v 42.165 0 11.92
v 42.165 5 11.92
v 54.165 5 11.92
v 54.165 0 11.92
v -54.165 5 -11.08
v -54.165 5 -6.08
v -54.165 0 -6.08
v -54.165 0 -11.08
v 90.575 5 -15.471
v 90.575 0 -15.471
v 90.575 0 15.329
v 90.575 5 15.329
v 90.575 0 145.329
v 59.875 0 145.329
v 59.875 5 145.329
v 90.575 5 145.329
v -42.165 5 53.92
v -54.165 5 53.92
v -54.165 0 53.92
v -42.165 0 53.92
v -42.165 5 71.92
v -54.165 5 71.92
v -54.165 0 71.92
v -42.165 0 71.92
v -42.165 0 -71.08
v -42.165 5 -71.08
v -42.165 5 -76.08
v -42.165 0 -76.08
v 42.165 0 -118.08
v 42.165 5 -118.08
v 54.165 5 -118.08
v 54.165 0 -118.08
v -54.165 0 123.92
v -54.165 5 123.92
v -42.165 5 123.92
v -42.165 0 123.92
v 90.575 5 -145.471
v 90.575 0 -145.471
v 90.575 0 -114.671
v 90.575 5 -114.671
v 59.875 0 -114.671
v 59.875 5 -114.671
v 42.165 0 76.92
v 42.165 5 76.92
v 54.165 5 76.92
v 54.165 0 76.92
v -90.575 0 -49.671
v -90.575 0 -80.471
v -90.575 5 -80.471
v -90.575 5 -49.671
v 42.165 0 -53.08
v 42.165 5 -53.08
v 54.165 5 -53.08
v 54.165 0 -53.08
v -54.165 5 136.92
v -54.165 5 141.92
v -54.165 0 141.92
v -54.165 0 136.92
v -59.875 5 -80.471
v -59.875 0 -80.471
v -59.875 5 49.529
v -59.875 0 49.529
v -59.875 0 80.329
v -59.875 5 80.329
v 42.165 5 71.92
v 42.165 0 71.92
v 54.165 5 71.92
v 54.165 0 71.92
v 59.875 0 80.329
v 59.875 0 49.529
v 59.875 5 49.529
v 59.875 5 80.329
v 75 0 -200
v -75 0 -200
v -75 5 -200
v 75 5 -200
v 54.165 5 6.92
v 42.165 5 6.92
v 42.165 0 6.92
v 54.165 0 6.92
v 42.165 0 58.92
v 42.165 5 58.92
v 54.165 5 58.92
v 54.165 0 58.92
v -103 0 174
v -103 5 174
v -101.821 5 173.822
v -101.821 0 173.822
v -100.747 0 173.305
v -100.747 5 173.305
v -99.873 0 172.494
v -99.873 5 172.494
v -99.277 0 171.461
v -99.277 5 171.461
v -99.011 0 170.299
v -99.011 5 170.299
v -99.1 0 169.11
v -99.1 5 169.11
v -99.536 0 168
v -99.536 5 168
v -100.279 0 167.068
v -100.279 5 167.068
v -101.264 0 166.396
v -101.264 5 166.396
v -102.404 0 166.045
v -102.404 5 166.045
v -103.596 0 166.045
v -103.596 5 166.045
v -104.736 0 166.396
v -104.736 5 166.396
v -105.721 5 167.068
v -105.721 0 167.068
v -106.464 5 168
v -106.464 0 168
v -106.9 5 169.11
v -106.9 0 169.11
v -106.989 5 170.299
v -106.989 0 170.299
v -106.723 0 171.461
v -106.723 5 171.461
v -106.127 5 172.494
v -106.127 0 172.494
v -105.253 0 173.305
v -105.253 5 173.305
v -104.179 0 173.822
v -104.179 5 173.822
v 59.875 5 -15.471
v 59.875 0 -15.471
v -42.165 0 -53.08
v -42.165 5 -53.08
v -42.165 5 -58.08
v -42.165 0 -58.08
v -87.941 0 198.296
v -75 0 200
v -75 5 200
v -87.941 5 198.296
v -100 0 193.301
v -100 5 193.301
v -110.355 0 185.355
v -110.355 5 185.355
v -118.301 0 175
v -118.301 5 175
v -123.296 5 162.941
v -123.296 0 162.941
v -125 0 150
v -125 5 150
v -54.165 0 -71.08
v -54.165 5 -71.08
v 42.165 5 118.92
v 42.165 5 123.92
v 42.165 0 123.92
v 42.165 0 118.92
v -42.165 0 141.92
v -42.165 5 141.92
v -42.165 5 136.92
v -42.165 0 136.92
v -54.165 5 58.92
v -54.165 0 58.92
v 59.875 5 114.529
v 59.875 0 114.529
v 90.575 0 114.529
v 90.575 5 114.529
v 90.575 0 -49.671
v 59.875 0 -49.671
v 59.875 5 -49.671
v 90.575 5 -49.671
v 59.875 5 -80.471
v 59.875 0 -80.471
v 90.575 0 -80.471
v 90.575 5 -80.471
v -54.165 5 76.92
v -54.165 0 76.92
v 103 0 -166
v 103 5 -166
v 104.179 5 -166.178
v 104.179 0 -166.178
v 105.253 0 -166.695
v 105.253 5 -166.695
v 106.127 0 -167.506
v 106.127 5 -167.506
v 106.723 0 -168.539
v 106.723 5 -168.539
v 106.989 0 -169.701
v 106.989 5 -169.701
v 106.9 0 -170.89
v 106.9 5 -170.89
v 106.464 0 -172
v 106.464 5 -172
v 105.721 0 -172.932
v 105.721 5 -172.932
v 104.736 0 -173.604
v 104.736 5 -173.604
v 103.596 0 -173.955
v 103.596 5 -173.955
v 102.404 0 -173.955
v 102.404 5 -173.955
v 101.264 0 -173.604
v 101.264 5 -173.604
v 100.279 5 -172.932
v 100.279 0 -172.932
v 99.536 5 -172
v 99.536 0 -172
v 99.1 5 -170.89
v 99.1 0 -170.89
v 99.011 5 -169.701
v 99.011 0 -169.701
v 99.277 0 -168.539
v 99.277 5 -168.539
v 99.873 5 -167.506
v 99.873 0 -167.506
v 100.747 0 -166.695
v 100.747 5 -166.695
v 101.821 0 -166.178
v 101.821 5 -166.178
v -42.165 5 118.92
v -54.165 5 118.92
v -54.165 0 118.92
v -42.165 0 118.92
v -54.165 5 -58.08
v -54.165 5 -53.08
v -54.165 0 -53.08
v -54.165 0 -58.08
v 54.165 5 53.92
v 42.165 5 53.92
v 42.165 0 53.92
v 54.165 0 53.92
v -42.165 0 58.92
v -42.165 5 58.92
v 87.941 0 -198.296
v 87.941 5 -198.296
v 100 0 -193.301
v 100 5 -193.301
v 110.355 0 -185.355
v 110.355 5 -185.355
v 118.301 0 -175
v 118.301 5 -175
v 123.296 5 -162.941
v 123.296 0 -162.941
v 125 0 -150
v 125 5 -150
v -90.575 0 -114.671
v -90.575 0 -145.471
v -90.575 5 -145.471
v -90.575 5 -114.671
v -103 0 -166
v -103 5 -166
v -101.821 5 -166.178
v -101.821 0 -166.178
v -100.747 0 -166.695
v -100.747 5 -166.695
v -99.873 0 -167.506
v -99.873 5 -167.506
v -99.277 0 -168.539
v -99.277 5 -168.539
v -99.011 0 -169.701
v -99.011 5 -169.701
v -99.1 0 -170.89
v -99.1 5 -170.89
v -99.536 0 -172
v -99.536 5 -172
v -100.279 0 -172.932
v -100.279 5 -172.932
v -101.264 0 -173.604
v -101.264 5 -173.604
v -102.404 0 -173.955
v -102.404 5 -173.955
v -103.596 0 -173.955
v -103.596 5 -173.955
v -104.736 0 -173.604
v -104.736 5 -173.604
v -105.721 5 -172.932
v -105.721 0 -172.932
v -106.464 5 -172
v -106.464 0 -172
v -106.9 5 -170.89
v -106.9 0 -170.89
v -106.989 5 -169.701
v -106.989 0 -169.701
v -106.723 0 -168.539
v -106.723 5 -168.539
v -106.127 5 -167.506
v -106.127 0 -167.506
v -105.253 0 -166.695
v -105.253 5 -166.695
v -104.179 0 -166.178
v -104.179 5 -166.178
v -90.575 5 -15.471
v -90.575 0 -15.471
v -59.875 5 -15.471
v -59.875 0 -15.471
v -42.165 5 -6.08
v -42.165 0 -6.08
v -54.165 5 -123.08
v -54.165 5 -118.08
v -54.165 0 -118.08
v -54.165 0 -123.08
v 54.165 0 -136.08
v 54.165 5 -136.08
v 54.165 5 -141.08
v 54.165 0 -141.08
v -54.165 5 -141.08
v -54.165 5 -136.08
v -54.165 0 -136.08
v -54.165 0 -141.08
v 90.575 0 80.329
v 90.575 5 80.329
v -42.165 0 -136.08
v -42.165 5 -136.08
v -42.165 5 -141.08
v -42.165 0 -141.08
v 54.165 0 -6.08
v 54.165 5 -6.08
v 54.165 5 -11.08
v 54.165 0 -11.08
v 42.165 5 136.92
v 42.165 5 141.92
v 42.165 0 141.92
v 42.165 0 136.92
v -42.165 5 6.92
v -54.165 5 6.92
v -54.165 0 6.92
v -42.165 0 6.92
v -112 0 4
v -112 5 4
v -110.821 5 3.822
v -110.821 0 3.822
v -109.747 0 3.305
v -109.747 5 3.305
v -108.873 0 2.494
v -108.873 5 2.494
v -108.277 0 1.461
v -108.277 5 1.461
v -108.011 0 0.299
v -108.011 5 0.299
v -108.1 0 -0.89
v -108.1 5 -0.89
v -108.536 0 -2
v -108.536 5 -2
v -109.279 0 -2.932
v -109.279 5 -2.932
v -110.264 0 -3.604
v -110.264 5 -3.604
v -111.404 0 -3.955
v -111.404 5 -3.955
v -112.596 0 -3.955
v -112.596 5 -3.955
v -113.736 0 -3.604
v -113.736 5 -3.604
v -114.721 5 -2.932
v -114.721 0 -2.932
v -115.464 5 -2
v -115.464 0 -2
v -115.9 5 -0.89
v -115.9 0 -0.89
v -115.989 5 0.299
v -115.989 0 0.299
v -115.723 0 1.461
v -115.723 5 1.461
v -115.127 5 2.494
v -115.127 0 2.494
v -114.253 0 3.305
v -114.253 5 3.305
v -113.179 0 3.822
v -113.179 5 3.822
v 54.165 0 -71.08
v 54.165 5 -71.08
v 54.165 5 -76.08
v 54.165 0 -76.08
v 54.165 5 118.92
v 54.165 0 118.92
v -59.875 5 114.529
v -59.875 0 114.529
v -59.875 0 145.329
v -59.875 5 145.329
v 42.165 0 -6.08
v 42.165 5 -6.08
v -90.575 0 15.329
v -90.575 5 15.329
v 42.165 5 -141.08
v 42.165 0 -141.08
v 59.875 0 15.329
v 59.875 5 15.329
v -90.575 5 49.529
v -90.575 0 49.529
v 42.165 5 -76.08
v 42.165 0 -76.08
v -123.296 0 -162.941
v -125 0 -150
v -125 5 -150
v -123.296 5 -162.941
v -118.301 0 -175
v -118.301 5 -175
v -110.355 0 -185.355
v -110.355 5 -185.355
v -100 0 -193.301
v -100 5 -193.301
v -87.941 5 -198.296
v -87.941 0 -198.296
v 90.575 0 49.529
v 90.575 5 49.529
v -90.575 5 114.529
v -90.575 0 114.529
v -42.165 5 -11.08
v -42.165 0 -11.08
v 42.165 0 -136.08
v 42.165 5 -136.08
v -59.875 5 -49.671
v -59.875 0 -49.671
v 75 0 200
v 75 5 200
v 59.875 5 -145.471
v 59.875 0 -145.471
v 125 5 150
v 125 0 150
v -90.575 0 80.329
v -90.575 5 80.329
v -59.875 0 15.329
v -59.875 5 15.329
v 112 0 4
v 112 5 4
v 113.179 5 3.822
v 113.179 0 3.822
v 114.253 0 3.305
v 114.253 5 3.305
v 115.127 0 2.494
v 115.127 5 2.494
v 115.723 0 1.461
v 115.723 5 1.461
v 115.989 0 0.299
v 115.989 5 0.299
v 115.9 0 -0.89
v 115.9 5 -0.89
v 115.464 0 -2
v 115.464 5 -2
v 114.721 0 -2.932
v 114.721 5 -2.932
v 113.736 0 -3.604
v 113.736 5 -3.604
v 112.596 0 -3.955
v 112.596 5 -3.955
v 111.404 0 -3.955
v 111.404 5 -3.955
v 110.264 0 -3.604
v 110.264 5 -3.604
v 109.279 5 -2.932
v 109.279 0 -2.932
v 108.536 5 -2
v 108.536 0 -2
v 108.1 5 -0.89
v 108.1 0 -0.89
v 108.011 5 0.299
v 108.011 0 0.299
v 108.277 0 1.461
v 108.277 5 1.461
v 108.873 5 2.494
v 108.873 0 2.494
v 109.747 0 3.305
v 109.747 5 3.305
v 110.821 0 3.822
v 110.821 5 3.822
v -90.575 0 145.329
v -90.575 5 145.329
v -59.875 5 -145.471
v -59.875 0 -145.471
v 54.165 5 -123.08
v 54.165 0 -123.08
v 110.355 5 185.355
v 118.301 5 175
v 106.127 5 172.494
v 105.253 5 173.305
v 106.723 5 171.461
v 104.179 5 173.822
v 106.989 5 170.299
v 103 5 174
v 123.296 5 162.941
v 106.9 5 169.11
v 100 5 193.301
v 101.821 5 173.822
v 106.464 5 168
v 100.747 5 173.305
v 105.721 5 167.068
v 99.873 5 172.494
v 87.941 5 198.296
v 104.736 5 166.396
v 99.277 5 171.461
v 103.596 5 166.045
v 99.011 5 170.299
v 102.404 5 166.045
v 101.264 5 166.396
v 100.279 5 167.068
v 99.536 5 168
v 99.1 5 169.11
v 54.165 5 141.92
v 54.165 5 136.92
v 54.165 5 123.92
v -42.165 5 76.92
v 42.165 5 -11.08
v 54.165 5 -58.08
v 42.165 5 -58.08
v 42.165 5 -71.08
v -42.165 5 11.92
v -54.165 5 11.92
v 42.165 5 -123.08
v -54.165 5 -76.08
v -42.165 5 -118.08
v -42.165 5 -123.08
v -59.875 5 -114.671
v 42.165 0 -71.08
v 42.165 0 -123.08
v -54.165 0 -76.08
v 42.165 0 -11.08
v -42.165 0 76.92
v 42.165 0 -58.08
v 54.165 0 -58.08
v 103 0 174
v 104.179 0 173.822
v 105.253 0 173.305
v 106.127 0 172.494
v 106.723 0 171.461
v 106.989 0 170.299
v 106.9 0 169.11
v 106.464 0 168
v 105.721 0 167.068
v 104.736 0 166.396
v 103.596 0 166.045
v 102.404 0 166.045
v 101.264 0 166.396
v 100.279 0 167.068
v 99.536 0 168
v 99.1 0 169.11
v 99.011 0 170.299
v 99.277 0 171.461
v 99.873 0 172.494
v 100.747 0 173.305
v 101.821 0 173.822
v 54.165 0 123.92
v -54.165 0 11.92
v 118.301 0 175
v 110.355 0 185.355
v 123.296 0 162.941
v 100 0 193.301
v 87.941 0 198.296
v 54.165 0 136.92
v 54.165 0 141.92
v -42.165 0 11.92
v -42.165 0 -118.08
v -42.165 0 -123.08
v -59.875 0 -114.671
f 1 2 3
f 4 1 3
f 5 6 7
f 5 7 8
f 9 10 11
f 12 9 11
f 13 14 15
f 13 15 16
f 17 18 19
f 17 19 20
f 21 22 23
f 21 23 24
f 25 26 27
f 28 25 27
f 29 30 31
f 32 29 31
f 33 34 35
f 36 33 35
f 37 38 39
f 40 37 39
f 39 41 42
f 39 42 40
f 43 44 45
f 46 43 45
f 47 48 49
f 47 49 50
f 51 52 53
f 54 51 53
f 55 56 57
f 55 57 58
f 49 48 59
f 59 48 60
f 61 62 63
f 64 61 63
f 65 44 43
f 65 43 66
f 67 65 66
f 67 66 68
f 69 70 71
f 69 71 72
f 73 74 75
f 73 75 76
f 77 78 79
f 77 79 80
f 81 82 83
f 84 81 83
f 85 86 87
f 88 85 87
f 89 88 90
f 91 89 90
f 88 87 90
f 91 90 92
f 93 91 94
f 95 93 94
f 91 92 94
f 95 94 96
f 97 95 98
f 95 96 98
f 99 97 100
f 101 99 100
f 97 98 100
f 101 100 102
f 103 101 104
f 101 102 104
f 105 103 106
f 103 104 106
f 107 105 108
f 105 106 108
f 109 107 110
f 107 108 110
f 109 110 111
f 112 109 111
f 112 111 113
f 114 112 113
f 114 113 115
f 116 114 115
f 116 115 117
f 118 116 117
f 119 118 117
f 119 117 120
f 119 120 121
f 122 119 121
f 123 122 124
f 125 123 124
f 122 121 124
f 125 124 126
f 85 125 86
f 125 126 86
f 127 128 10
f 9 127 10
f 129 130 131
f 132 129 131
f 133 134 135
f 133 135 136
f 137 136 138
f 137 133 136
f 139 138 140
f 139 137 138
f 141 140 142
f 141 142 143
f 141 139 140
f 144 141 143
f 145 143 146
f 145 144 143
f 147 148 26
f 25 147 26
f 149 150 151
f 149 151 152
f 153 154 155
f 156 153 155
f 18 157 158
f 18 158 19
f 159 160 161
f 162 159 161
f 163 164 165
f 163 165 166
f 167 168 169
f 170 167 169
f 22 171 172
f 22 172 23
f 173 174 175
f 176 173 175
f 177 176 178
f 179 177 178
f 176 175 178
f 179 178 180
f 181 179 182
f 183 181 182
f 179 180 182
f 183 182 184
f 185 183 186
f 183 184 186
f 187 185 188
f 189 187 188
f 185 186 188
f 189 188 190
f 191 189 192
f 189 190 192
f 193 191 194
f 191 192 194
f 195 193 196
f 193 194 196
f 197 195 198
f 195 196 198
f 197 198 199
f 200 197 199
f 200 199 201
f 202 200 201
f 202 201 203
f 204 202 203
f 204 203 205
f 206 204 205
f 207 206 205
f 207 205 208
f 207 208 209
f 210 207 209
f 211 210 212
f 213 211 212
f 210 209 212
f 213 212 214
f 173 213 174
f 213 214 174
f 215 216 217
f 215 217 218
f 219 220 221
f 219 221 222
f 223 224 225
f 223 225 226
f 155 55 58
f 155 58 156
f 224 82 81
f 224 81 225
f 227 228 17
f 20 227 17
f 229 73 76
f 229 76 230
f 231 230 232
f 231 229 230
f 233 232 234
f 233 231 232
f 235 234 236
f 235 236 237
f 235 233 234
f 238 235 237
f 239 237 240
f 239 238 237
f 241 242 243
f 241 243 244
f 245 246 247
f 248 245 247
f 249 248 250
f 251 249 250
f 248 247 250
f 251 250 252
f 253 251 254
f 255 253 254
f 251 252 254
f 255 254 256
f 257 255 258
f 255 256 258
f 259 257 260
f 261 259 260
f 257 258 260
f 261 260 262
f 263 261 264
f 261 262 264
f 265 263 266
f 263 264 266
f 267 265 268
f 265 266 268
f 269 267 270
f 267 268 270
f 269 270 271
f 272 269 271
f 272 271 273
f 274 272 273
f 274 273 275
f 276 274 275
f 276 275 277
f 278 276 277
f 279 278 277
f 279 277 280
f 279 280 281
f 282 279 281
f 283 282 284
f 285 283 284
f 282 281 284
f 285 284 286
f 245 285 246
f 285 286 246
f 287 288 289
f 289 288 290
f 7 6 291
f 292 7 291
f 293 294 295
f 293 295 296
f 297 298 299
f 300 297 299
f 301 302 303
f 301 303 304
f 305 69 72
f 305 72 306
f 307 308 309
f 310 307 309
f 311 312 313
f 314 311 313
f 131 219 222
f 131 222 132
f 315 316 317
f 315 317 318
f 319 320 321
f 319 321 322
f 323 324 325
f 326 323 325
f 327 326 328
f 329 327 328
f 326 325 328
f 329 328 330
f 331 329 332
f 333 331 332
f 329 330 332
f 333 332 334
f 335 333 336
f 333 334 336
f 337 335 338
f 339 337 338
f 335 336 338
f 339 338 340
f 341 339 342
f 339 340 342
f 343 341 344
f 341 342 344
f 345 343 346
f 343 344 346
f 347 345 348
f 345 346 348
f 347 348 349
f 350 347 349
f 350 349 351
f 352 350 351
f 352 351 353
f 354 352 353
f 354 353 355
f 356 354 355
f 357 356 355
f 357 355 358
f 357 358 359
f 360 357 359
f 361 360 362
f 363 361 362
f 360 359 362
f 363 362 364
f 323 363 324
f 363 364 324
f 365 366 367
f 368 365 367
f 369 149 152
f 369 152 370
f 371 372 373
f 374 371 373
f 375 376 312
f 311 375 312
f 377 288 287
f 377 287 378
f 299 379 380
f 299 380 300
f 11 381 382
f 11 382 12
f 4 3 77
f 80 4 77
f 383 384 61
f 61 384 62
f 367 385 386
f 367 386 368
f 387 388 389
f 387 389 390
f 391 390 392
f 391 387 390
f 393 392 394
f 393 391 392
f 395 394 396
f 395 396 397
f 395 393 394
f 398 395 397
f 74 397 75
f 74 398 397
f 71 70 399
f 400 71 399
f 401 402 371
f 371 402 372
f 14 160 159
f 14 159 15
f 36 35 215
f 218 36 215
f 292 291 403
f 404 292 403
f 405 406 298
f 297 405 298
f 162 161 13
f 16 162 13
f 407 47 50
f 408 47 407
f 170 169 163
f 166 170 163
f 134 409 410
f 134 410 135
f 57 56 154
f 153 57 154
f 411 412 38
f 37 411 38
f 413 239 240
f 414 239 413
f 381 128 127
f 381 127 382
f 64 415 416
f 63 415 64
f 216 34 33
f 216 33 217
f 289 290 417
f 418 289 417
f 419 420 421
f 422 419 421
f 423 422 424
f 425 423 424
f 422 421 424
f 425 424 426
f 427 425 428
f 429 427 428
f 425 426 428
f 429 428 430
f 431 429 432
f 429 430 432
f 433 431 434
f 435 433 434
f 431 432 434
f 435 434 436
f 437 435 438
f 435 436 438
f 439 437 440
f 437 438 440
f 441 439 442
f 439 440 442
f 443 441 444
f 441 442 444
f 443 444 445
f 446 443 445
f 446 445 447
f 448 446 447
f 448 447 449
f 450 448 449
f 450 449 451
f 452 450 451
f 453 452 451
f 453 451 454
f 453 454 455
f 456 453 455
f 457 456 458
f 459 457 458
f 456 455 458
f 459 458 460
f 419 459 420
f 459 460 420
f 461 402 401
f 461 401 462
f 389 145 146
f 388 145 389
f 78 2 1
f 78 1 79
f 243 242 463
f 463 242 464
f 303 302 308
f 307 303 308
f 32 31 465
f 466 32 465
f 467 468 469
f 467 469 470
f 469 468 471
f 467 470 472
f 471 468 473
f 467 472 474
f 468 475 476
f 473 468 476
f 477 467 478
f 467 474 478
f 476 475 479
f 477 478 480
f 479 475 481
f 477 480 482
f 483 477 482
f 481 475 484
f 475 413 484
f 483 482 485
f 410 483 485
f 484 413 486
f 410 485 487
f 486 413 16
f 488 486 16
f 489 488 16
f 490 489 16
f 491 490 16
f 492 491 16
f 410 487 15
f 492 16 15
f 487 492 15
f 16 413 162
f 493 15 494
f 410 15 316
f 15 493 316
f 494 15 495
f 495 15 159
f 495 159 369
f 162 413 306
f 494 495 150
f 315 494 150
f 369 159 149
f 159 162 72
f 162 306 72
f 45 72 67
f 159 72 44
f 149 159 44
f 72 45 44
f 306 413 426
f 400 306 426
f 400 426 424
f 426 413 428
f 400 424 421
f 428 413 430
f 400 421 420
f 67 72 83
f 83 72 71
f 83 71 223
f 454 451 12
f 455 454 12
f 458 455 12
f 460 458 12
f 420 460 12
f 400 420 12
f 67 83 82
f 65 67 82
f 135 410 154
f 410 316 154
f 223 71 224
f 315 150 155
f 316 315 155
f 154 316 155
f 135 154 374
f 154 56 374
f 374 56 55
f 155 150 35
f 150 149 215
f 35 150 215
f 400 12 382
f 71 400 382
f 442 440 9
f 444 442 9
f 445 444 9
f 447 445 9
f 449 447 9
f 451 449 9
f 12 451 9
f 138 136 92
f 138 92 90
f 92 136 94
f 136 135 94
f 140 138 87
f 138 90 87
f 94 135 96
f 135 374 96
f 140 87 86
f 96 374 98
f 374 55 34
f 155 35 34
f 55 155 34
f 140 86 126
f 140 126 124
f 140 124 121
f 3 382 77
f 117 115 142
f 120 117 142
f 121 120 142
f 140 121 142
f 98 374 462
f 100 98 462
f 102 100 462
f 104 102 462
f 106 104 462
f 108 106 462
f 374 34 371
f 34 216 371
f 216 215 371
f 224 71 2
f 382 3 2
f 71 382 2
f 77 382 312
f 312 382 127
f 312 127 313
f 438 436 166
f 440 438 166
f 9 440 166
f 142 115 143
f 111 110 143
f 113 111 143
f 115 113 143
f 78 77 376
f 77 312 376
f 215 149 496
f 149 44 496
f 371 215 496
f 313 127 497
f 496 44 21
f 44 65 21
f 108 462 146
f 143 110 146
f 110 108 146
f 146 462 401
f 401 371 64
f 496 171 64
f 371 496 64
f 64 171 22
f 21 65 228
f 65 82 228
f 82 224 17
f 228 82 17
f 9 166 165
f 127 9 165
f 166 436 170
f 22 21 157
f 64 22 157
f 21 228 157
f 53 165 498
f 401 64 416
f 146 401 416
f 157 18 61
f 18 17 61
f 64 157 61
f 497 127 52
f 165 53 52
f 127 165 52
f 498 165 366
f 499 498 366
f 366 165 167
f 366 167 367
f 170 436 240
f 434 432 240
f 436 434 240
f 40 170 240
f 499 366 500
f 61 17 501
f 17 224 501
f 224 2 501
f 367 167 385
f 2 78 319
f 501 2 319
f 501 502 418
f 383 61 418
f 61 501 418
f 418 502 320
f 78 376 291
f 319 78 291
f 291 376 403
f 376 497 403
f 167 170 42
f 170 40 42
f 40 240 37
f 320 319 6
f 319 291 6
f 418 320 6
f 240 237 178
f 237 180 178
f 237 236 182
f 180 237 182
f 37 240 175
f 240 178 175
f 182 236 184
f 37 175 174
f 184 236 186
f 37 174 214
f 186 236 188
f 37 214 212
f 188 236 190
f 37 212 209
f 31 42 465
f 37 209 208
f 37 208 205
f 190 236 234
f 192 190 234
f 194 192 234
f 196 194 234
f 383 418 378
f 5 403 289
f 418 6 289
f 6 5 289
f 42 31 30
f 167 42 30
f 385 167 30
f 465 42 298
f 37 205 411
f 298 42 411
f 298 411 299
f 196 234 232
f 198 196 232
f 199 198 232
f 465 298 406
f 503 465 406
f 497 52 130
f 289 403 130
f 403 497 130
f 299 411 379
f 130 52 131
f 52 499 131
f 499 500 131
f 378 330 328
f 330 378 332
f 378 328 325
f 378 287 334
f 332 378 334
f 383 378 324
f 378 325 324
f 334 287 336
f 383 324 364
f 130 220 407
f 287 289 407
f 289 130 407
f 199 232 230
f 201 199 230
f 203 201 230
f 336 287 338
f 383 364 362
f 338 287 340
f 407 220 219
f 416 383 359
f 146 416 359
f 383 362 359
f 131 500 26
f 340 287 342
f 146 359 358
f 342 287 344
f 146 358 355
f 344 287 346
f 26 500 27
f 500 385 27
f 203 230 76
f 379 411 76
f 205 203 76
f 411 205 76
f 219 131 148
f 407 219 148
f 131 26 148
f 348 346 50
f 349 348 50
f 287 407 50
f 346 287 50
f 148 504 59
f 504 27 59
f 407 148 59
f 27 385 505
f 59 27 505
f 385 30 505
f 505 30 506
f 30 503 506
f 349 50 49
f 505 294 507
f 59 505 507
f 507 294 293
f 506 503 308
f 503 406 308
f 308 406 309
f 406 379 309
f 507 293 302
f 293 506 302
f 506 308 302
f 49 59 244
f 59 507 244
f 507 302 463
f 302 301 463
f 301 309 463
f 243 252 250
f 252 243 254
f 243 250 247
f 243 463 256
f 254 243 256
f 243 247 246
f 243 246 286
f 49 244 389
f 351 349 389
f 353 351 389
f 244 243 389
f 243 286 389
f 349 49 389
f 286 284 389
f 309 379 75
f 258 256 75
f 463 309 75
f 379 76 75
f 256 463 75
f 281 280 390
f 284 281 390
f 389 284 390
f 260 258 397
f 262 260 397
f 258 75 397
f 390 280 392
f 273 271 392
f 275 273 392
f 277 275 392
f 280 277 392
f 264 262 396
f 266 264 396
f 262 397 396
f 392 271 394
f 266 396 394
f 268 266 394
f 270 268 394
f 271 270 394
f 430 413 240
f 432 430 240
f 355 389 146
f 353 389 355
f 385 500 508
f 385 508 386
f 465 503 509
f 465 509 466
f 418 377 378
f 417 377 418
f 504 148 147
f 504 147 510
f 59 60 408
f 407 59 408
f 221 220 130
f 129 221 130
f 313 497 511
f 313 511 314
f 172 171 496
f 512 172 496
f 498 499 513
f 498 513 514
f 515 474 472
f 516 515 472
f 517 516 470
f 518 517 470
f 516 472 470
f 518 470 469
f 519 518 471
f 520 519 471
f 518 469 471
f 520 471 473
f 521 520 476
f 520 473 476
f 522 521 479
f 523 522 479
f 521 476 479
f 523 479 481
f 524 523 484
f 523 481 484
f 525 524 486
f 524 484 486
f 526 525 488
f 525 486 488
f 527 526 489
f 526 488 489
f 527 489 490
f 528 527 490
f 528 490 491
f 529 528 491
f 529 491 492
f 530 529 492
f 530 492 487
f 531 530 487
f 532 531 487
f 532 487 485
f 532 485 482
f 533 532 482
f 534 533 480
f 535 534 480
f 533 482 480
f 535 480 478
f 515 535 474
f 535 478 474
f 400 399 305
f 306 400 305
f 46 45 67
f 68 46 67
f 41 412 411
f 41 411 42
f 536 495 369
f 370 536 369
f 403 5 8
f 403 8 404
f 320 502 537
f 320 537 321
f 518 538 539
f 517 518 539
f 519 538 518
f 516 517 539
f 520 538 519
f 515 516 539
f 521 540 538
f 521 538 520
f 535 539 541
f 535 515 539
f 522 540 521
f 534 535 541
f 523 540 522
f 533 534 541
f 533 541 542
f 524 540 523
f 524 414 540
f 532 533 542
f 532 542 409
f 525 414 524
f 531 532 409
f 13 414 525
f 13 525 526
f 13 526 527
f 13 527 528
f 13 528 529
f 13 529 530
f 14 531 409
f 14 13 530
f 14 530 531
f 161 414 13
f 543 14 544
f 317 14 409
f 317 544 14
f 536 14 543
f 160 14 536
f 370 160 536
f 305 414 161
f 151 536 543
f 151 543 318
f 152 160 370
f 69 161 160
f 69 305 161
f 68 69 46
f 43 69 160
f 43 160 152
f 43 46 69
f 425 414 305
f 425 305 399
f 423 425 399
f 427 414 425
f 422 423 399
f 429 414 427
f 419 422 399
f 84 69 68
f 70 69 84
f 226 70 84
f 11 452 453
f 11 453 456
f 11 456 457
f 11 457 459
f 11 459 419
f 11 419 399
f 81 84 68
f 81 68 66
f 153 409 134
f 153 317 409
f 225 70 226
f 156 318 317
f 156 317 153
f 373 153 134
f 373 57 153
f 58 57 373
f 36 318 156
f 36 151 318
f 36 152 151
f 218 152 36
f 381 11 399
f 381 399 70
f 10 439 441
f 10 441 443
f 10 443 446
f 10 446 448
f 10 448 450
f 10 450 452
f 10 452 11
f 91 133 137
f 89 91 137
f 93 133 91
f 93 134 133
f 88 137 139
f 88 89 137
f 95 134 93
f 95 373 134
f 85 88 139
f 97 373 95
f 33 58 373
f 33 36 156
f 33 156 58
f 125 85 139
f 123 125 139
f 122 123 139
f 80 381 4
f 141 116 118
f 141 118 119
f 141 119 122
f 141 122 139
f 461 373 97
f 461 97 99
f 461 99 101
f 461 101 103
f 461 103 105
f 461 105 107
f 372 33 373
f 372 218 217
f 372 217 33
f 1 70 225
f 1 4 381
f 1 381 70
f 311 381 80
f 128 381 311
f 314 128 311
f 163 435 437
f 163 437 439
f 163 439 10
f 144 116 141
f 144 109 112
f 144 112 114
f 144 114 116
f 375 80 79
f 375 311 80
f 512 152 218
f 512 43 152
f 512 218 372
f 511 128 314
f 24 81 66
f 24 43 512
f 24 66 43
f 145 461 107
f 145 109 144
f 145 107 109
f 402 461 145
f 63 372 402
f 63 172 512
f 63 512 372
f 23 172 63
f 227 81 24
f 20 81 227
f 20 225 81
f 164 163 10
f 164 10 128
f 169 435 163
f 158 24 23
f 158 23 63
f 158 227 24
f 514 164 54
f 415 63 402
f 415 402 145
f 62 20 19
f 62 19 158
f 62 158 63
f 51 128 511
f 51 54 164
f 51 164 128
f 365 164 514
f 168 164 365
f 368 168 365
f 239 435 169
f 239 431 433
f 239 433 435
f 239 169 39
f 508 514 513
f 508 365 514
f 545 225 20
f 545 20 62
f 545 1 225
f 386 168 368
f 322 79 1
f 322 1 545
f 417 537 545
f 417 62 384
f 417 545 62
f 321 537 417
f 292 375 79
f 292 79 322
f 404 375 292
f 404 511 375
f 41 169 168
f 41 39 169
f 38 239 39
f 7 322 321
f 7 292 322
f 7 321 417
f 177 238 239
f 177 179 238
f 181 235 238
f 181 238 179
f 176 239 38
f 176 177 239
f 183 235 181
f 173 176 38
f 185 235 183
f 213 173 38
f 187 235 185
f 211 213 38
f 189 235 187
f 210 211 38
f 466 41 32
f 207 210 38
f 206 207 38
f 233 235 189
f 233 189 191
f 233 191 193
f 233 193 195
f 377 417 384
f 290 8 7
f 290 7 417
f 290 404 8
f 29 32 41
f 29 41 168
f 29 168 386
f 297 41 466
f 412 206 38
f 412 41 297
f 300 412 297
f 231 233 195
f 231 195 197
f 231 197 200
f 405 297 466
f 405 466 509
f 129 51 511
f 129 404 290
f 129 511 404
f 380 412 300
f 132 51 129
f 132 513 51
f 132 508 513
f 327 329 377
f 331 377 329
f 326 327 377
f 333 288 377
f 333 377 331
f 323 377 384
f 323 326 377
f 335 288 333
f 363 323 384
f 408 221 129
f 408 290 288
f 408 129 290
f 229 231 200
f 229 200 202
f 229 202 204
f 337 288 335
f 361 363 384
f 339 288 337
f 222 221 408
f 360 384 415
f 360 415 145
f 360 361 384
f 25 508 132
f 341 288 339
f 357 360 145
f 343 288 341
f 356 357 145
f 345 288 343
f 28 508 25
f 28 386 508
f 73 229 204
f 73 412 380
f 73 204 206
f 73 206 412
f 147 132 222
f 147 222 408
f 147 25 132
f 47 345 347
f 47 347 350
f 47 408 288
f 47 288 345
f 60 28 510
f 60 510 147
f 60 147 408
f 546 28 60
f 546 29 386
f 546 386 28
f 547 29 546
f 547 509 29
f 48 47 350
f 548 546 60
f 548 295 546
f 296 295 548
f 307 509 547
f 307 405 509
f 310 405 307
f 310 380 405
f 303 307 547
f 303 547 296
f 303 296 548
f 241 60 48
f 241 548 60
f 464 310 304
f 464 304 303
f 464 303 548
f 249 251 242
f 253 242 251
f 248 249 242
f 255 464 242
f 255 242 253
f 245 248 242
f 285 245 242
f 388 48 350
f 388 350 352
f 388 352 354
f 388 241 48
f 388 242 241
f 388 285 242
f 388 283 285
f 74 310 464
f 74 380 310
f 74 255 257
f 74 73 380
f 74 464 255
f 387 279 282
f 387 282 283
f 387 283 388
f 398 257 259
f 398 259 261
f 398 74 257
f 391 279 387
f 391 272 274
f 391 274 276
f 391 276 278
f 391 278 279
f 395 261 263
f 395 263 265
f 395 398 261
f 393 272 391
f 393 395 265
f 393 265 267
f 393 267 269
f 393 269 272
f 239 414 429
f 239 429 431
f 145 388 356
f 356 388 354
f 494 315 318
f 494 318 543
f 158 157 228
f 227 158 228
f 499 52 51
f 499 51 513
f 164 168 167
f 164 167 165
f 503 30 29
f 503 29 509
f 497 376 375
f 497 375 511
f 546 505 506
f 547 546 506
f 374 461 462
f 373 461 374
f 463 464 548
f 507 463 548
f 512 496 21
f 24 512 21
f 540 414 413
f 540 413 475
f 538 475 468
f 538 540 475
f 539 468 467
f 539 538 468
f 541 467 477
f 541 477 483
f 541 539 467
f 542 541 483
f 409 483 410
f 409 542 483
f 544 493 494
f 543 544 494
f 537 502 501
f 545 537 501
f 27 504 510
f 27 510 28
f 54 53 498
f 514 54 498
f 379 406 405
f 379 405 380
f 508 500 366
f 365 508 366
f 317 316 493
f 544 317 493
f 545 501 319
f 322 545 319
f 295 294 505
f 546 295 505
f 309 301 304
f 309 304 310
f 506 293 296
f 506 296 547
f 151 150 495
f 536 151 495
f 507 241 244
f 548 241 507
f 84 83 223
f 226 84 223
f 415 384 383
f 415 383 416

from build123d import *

# Parameters (mm, degrees)
BOSS_EXTRUDE1_DEPTH = 5
SKETCH3_W           = 30.7
SKETCH3_H           = 30.8
SKETCH3_W_2         = 30.3
SKETCH3_H_2         = 30.4
CUT_EXTRUDE1_DEPTH  = 10
LPATTERN1_COUNT     = 5
LPATTERN1_PITCH     = 65
SKETCH4_W           = 12
SKETCH4_H           = 5
CUT_EXTRUDE2_DEPTH  = 10
LPATTERN2_COUNT     = 5
LPATTERN2_PITCH     = 65
SKETCH5_R           = 4
CUT_EXTRUDE3_DEPTH  = 5


with BuildPart() as part:
    # Sketch1 → Boss-Extrude1 (new body)
    with BuildSketch(Plane(origin=(0, 0, 0), x_dir=(1, 0, 0), z_dir=(0, 1, 0))):
        with BuildLine():
            Line((-75, 200), (75, 200))
            ThreePointArc((75, 200), (110.355339059, 185.355339059), (125, 150))
            Line((125, 150), (125, -150))
            ThreePointArc((125, -150), (110.355339059, -185.355339059), (75, -200))
            Line((75, -200), (-75, -200))
            ThreePointArc((-75, -200), (-110.355339059, -185.355339059), (-125, -150))
            Line((-125, -150), (-125, 150))
            ThreePointArc((-125, 150), (-110.355339059, 185.355339059), (-75, 200))
        make_face()
    extrude(amount=BOSS_EXTRUDE1_DEPTH)

    # Sketch3 → Cut-Extrude1 (cut)
    # profile 1 of 4: a face of its own
    with BuildSketch(Plane.XZ):
        with Locations((-75.225, 129.928570167)):
            Rectangle(SKETCH3_W, SKETCH3_H)
        with Locations((-75.225, 129.928570167)):
            Rectangle(SKETCH3_W_2, SKETCH3_H_2, mode=Mode.SUBTRACT)
    # profile 2 of 4: a face of its own
    with BuildSketch(Plane.XZ):
        with Locations((-75.225, 129.928570167)):
            Rectangle(SKETCH3_W_2, SKETCH3_H_2)
    # profile 3 of 4: a face of its own
    with BuildSketch(Plane.XZ):
        with Locations((75.225, 129.928570167)):
            Rectangle(SKETCH3_W, SKETCH3_H)
        with Locations((75.225, 129.928570167)):
            Rectangle(SKETCH3_W_2, SKETCH3_H_2, mode=Mode.SUBTRACT)
    # profile 4 of 4: a face of its own
    with BuildSketch(Plane.XZ):
        with Locations((75.225, 129.928570167)):
            Rectangle(SKETCH3_W_2, SKETCH3_H_2)
    cut_extrude1 = extrude(amount=-CUT_EXTRUDE1_DEPTH, mode=Mode.SUBTRACT)

    # LPattern1: Cut-Extrude1 ×5
    with Locations(*[(0, 0, -i * LPATTERN1_PITCH) for i in range(1, LPATTERN1_COUNT)]):
        add(cut_extrude1, mode=Mode.SUBTRACT)

    # Sketch4 → Cut-Extrude2 (cut)
    with BuildSketch(Plane(origin=(0, 5, 0), x_dir=(1, 0, 0), z_dir=(0, 1, 0))):
        with Locations((-48.165, -139.42)):
            Rectangle(SKETCH4_W, SKETCH4_H)
        with Locations((-48.165, -121.42)):
            Rectangle(SKETCH4_W, SKETCH4_H)
        with Locations((48.165, -139.42)):
            Rectangle(SKETCH4_W, SKETCH4_H)
        with Locations((48.165, -121.42)):
            Rectangle(SKETCH4_W, SKETCH4_H)
    cut_extrude2 = extrude(amount=-CUT_EXTRUDE2_DEPTH, mode=Mode.SUBTRACT)

    # LPattern2: Cut-Extrude2 ×5
    with Locations(*[(0, 0, -i * LPATTERN2_PITCH) for i in range(1, LPATTERN2_COUNT)]):
        add(cut_extrude2, mode=Mode.SUBTRACT)

    # Sketch5 → Cut-Extrude3 (cut)
    with BuildSketch(Plane(origin=(0, 5, 0), x_dir=(1, 0, 0), z_dir=(0, 1, 0))):
        with Locations(Location((-103, 170, 0), (0, 0, 270))):
            Circle(SKETCH5_R)
        with Locations(Location((103, 170, 0), (0, 0, 270))):
            Circle(SKETCH5_R)
        with Locations(Location((103, -170, 0), (0, 0, 270))):
            Circle(SKETCH5_R)
        with Locations(Location((-103, -170, 0), (0, 0, 270))):
            Circle(SKETCH5_R)
        with Locations(Location((-112, 0, 0), (0, 0, 270))):
            Circle(SKETCH5_R)
        with Locations(Location((112, 0, 0), (0, 0, 270))):
            Circle(SKETCH5_R)
    extrude(amount=-CUT_EXTRUDE3_DEPTH, mode=Mode.SUBTRACT)


solid = part.part
